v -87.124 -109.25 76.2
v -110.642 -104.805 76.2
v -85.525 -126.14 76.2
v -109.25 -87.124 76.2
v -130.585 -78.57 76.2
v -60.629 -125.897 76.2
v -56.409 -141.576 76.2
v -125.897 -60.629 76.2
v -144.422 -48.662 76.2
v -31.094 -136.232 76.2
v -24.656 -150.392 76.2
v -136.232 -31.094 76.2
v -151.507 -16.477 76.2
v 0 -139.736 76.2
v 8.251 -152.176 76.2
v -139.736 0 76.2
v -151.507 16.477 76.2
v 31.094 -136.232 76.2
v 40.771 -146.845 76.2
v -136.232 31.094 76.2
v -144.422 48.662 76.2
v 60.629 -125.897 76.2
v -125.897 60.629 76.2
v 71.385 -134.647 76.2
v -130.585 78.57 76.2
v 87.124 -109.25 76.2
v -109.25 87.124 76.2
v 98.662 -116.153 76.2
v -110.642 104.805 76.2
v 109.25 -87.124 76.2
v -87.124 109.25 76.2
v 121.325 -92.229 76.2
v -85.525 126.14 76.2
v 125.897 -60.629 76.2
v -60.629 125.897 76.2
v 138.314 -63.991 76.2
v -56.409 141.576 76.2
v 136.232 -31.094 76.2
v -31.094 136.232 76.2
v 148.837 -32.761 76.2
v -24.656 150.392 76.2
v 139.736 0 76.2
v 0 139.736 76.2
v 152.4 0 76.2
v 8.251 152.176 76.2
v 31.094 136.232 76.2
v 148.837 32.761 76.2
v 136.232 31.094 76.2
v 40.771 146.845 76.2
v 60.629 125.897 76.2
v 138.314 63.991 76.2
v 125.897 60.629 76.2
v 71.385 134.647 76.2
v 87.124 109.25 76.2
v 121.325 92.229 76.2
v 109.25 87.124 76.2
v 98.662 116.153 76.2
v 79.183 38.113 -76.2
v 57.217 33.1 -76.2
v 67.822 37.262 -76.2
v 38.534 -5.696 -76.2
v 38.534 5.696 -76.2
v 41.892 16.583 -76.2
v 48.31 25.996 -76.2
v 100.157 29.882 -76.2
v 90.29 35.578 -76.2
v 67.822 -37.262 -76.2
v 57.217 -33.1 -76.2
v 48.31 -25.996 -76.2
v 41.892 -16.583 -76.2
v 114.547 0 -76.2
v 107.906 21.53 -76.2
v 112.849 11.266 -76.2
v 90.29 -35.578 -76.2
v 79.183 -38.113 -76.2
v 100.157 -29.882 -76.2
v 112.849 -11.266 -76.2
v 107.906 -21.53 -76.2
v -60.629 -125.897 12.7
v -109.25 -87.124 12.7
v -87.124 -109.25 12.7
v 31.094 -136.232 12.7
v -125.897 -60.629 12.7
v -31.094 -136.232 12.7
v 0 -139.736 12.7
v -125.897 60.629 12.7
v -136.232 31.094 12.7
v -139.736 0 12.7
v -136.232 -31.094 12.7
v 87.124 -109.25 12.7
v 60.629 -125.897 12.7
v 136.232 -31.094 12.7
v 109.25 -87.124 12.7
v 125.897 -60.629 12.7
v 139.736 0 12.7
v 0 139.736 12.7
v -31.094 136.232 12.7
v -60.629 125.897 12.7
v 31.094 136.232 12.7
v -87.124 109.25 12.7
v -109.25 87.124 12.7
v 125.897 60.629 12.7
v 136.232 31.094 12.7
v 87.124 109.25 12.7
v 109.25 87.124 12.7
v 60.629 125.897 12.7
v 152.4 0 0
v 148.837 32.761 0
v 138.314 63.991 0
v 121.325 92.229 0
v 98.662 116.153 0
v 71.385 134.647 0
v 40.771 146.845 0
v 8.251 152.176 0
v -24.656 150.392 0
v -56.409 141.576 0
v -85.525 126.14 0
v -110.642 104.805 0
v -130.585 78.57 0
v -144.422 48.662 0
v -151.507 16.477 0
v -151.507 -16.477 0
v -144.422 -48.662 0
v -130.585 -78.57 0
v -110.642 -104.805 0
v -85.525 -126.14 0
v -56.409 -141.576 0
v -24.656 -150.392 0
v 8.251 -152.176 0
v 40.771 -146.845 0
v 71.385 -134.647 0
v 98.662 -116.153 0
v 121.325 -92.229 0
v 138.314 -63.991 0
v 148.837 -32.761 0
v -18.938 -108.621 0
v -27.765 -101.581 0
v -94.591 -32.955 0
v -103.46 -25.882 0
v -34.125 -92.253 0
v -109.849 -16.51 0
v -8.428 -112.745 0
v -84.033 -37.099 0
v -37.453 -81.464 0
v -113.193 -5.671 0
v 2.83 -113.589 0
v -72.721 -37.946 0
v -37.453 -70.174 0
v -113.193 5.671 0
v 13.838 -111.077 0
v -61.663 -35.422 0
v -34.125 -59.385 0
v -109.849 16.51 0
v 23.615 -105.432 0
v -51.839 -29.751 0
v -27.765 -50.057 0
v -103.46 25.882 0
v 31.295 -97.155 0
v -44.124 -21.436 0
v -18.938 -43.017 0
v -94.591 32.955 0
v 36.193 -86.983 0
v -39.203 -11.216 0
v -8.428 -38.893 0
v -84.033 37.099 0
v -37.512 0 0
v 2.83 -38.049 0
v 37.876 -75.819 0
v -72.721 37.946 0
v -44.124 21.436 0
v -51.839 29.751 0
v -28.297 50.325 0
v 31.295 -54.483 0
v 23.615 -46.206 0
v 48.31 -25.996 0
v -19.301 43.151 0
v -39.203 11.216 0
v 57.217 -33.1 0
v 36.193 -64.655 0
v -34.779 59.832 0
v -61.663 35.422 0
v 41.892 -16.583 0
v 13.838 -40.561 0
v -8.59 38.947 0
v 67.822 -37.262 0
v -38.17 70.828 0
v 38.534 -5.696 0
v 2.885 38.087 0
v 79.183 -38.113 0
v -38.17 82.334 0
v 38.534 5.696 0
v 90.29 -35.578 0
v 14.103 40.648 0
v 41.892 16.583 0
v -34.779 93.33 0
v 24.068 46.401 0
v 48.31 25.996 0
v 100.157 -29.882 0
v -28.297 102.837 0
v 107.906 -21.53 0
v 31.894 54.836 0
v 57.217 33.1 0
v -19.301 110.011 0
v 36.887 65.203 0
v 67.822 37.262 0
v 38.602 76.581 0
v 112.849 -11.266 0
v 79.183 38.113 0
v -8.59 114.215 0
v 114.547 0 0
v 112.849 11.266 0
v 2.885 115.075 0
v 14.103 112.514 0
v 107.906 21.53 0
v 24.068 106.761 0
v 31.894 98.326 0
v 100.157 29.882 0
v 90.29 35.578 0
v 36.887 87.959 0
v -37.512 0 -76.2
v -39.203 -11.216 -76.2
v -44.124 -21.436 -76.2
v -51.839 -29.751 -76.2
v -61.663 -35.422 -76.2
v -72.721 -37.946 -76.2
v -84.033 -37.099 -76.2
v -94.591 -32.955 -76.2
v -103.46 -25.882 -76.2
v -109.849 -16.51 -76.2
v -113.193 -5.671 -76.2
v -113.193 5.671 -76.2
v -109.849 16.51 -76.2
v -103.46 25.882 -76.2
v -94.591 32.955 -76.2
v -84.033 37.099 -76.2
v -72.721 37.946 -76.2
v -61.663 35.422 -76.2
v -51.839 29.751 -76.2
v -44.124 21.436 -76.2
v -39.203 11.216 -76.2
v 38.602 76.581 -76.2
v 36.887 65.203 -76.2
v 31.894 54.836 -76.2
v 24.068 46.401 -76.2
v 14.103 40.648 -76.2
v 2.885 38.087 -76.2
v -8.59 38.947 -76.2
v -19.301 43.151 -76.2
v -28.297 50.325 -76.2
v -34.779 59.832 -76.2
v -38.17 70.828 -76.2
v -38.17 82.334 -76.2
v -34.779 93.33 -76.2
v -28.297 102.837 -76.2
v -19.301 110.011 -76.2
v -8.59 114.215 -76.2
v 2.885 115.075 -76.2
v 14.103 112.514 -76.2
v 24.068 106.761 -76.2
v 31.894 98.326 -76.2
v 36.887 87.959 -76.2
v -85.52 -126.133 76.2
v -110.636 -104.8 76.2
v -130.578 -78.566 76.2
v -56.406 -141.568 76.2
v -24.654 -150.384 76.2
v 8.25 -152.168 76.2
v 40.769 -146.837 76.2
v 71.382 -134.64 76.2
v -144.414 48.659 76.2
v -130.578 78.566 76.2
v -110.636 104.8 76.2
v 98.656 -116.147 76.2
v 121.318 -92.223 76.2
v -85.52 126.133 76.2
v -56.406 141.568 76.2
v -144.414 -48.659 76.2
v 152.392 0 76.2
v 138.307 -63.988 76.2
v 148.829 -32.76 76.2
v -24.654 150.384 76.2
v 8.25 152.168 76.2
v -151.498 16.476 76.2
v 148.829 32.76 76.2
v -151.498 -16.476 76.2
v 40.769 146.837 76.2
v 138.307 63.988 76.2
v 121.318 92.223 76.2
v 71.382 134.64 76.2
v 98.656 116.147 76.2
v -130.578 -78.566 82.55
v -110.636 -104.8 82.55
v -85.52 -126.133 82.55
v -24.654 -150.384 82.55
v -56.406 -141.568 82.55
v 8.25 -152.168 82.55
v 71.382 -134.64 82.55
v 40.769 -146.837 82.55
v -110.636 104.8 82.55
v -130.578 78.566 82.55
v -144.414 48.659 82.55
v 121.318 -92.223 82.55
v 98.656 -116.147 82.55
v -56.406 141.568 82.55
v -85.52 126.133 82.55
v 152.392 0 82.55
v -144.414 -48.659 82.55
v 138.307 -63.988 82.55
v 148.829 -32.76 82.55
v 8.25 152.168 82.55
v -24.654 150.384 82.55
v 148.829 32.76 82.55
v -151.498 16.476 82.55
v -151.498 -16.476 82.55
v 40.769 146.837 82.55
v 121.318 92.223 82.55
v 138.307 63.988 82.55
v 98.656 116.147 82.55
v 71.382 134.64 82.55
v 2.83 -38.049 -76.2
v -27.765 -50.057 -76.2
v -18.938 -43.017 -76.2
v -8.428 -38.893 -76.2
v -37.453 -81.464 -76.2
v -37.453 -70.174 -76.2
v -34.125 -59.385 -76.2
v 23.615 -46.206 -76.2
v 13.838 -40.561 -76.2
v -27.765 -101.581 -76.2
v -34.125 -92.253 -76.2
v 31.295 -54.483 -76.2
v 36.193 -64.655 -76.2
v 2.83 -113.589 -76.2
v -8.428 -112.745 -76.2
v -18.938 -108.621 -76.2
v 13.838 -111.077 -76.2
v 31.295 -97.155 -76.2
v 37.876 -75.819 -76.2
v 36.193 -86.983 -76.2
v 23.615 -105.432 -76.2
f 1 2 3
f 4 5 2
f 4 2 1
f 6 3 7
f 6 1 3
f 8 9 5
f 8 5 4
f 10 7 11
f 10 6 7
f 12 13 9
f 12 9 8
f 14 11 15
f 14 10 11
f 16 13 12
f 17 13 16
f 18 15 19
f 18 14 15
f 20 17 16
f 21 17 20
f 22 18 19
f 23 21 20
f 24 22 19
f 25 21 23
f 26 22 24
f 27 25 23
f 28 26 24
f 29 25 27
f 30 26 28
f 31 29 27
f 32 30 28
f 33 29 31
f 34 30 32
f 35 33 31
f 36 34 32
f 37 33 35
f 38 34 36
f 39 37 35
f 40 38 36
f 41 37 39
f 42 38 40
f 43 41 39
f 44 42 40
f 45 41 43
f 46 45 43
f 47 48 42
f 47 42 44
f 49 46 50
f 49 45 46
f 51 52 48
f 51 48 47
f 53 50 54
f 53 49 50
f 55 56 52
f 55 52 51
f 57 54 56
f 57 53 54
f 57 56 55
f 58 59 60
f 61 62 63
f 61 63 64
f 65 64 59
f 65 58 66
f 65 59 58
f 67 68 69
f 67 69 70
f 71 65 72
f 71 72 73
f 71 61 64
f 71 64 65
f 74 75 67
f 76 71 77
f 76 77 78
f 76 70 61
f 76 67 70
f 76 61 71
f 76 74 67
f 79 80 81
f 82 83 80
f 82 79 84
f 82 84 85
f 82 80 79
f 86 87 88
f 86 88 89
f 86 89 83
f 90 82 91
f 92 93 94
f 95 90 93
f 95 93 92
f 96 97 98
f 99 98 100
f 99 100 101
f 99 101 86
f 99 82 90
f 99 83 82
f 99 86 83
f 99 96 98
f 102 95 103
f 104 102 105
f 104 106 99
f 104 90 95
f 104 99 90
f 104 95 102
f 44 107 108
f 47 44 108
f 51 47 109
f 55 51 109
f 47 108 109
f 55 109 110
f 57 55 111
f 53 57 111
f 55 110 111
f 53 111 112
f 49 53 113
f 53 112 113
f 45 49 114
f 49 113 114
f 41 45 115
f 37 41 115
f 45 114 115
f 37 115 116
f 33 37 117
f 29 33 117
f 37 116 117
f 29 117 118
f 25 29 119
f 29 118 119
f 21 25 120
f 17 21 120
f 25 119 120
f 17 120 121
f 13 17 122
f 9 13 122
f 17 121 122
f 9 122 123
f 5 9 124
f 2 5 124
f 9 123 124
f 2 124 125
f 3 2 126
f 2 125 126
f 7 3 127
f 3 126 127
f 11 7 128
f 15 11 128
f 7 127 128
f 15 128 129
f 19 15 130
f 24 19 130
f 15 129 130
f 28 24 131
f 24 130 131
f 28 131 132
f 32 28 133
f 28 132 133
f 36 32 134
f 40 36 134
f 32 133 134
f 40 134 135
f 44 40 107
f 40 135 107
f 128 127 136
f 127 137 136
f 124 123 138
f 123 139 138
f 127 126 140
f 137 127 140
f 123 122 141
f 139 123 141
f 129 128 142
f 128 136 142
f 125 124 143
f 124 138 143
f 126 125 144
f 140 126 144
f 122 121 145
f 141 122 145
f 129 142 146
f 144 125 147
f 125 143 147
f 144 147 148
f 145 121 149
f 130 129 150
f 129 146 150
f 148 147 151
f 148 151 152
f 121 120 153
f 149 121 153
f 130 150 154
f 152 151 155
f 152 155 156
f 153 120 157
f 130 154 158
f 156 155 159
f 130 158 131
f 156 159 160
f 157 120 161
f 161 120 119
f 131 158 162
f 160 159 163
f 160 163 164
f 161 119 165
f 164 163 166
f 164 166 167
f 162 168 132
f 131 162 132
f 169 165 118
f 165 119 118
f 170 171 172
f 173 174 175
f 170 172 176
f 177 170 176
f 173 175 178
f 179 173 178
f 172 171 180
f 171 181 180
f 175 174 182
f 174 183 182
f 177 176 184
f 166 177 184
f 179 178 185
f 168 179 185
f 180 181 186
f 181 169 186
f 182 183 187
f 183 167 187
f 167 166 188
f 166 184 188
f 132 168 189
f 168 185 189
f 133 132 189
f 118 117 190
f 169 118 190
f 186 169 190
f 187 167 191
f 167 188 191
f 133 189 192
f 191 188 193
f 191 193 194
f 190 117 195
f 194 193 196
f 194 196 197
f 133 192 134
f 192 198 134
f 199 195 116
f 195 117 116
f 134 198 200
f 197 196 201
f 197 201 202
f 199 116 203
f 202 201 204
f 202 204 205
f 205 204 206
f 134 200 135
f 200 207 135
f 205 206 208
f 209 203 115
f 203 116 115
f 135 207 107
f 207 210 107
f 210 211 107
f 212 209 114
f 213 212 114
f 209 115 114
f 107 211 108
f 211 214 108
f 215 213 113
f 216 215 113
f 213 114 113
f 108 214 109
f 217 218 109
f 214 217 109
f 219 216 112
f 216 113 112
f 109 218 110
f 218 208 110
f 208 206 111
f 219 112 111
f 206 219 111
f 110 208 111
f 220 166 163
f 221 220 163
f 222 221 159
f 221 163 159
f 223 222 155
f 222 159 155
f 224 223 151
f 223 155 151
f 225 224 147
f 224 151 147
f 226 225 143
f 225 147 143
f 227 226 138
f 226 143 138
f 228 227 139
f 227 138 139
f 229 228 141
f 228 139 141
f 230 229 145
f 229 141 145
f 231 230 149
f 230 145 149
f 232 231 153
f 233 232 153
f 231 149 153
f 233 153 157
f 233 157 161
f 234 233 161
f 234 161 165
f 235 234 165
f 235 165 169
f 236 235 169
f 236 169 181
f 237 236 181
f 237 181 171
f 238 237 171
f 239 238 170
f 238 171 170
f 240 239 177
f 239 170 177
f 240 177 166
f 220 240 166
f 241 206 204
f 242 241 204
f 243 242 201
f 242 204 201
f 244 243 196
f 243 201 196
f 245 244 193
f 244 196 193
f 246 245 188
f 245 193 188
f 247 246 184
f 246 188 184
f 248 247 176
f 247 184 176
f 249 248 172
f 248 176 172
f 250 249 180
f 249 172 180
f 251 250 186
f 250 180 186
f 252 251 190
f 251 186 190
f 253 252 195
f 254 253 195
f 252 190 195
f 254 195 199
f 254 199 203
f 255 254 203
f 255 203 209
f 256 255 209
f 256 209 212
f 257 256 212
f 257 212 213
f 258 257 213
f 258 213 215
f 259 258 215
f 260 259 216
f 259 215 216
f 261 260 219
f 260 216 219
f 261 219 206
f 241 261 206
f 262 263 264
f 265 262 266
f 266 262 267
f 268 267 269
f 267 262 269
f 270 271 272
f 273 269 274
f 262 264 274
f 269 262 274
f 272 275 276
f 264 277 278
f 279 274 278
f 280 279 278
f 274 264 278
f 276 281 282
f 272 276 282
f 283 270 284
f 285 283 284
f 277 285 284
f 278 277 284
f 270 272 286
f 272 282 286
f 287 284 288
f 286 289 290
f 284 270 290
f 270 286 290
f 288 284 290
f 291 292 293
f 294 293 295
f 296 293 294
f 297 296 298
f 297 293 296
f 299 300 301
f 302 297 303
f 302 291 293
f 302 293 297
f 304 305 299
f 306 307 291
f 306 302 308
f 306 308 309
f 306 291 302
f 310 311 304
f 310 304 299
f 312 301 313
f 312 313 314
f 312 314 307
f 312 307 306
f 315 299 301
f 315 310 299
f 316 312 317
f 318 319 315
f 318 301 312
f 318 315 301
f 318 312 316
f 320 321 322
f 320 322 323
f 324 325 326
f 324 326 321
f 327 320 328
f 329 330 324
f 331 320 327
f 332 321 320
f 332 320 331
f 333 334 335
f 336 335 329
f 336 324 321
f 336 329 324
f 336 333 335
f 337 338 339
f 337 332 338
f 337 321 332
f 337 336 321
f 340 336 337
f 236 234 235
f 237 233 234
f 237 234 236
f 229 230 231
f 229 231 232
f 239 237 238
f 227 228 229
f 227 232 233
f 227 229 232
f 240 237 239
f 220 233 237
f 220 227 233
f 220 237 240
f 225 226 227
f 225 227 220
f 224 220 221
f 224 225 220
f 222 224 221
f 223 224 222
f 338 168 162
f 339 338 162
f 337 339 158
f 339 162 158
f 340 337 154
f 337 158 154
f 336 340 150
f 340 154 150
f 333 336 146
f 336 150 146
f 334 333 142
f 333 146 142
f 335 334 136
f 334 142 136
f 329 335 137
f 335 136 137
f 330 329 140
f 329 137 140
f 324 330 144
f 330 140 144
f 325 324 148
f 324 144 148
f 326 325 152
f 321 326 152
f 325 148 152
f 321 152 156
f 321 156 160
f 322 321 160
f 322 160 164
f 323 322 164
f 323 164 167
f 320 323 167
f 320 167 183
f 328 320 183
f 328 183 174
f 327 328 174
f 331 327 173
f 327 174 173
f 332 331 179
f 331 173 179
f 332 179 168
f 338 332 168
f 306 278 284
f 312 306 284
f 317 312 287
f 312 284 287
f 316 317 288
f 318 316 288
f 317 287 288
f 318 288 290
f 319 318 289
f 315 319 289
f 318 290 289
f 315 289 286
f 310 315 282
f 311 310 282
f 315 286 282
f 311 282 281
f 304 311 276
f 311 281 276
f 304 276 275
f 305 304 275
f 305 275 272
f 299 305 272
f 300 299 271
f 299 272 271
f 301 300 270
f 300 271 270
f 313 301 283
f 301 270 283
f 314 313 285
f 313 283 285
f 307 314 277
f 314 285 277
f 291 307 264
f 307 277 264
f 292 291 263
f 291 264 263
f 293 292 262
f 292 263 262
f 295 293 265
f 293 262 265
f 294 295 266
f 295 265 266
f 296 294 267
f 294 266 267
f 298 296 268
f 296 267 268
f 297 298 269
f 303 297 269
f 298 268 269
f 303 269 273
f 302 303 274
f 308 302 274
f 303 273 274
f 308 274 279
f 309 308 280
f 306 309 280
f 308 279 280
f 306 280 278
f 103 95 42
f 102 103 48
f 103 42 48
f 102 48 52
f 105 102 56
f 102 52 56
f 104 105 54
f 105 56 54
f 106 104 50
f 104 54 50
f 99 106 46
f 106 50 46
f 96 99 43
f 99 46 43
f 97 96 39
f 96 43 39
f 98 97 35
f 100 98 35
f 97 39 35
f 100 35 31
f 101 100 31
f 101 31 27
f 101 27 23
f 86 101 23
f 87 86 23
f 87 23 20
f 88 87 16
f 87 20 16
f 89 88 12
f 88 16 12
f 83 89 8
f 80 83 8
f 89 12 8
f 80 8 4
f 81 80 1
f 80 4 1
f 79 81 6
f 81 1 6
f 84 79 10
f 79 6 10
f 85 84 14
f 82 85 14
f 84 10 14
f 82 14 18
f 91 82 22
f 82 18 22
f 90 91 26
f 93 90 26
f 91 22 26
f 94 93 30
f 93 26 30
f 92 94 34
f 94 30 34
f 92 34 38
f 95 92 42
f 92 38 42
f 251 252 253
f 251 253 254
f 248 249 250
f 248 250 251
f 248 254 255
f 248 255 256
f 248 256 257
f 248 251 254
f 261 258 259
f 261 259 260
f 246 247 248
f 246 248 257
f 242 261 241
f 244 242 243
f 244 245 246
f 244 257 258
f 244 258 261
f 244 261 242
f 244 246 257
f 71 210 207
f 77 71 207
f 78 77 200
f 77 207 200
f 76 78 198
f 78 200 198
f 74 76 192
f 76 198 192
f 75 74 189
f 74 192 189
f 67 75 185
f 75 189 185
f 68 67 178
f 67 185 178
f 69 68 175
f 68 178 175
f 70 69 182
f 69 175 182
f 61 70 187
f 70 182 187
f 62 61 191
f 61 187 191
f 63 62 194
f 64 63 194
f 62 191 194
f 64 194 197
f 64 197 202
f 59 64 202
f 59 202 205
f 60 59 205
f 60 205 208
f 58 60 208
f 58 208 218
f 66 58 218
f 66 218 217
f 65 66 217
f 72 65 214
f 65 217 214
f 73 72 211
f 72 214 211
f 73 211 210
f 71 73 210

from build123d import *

# Parameters (mm, degrees)
F0_R     = 152.4
F1_DEPTH = 76.2
F2_R     = 139.735673
F3_DEPTH = 63.5
F4_R     = 152.391644
F5_DEPTH = 6.35
F6_R     = 38.220257
F6_R_2   = 37.876034
F6_R_3   = 38.05277
F6_R_4   = 38.601519
F7_DEPTH = 76.2


with BuildPart() as f1:
    # F0 (on Top) → F1 (new body)
    with BuildSketch(Plane.XY):
        Circle(F0_R)
    extrude(amount=F1_DEPTH)

    # F2 (on face) → F3 (cut)
    with BuildSketch(Plane.XY.offset(76.2)):
        Circle(F2_R)
    extrude(amount=-F3_DEPTH, mode=Mode.SUBTRACT)

    # F6 (on face) → F7 (join)
    with BuildSketch(Plane(origin=(0, 0, 0), x_dir=(1, 0, 0), z_dir=(0, 0, -1))):
        with Locations((76.326996, 0)):
            Circle(F6_R)
        with Locations((0, 75.819001)):
            Circle(F6_R_2)
        with Locations((-75.565003, 0)):
            Circle(F6_R_3)
        with Locations((0, -76.581001)):
            Circle(F6_R_4)
    extrude(amount=F7_DEPTH)


with BuildPart() as f5:
    # F4 (on face) → F5 (new body)
    with BuildSketch(Plane.XY.offset(76.2)):
        Circle(F4_R)
    extrude(amount=F5_DEPTH)


solid = Compound([f1.part, f5.part])
